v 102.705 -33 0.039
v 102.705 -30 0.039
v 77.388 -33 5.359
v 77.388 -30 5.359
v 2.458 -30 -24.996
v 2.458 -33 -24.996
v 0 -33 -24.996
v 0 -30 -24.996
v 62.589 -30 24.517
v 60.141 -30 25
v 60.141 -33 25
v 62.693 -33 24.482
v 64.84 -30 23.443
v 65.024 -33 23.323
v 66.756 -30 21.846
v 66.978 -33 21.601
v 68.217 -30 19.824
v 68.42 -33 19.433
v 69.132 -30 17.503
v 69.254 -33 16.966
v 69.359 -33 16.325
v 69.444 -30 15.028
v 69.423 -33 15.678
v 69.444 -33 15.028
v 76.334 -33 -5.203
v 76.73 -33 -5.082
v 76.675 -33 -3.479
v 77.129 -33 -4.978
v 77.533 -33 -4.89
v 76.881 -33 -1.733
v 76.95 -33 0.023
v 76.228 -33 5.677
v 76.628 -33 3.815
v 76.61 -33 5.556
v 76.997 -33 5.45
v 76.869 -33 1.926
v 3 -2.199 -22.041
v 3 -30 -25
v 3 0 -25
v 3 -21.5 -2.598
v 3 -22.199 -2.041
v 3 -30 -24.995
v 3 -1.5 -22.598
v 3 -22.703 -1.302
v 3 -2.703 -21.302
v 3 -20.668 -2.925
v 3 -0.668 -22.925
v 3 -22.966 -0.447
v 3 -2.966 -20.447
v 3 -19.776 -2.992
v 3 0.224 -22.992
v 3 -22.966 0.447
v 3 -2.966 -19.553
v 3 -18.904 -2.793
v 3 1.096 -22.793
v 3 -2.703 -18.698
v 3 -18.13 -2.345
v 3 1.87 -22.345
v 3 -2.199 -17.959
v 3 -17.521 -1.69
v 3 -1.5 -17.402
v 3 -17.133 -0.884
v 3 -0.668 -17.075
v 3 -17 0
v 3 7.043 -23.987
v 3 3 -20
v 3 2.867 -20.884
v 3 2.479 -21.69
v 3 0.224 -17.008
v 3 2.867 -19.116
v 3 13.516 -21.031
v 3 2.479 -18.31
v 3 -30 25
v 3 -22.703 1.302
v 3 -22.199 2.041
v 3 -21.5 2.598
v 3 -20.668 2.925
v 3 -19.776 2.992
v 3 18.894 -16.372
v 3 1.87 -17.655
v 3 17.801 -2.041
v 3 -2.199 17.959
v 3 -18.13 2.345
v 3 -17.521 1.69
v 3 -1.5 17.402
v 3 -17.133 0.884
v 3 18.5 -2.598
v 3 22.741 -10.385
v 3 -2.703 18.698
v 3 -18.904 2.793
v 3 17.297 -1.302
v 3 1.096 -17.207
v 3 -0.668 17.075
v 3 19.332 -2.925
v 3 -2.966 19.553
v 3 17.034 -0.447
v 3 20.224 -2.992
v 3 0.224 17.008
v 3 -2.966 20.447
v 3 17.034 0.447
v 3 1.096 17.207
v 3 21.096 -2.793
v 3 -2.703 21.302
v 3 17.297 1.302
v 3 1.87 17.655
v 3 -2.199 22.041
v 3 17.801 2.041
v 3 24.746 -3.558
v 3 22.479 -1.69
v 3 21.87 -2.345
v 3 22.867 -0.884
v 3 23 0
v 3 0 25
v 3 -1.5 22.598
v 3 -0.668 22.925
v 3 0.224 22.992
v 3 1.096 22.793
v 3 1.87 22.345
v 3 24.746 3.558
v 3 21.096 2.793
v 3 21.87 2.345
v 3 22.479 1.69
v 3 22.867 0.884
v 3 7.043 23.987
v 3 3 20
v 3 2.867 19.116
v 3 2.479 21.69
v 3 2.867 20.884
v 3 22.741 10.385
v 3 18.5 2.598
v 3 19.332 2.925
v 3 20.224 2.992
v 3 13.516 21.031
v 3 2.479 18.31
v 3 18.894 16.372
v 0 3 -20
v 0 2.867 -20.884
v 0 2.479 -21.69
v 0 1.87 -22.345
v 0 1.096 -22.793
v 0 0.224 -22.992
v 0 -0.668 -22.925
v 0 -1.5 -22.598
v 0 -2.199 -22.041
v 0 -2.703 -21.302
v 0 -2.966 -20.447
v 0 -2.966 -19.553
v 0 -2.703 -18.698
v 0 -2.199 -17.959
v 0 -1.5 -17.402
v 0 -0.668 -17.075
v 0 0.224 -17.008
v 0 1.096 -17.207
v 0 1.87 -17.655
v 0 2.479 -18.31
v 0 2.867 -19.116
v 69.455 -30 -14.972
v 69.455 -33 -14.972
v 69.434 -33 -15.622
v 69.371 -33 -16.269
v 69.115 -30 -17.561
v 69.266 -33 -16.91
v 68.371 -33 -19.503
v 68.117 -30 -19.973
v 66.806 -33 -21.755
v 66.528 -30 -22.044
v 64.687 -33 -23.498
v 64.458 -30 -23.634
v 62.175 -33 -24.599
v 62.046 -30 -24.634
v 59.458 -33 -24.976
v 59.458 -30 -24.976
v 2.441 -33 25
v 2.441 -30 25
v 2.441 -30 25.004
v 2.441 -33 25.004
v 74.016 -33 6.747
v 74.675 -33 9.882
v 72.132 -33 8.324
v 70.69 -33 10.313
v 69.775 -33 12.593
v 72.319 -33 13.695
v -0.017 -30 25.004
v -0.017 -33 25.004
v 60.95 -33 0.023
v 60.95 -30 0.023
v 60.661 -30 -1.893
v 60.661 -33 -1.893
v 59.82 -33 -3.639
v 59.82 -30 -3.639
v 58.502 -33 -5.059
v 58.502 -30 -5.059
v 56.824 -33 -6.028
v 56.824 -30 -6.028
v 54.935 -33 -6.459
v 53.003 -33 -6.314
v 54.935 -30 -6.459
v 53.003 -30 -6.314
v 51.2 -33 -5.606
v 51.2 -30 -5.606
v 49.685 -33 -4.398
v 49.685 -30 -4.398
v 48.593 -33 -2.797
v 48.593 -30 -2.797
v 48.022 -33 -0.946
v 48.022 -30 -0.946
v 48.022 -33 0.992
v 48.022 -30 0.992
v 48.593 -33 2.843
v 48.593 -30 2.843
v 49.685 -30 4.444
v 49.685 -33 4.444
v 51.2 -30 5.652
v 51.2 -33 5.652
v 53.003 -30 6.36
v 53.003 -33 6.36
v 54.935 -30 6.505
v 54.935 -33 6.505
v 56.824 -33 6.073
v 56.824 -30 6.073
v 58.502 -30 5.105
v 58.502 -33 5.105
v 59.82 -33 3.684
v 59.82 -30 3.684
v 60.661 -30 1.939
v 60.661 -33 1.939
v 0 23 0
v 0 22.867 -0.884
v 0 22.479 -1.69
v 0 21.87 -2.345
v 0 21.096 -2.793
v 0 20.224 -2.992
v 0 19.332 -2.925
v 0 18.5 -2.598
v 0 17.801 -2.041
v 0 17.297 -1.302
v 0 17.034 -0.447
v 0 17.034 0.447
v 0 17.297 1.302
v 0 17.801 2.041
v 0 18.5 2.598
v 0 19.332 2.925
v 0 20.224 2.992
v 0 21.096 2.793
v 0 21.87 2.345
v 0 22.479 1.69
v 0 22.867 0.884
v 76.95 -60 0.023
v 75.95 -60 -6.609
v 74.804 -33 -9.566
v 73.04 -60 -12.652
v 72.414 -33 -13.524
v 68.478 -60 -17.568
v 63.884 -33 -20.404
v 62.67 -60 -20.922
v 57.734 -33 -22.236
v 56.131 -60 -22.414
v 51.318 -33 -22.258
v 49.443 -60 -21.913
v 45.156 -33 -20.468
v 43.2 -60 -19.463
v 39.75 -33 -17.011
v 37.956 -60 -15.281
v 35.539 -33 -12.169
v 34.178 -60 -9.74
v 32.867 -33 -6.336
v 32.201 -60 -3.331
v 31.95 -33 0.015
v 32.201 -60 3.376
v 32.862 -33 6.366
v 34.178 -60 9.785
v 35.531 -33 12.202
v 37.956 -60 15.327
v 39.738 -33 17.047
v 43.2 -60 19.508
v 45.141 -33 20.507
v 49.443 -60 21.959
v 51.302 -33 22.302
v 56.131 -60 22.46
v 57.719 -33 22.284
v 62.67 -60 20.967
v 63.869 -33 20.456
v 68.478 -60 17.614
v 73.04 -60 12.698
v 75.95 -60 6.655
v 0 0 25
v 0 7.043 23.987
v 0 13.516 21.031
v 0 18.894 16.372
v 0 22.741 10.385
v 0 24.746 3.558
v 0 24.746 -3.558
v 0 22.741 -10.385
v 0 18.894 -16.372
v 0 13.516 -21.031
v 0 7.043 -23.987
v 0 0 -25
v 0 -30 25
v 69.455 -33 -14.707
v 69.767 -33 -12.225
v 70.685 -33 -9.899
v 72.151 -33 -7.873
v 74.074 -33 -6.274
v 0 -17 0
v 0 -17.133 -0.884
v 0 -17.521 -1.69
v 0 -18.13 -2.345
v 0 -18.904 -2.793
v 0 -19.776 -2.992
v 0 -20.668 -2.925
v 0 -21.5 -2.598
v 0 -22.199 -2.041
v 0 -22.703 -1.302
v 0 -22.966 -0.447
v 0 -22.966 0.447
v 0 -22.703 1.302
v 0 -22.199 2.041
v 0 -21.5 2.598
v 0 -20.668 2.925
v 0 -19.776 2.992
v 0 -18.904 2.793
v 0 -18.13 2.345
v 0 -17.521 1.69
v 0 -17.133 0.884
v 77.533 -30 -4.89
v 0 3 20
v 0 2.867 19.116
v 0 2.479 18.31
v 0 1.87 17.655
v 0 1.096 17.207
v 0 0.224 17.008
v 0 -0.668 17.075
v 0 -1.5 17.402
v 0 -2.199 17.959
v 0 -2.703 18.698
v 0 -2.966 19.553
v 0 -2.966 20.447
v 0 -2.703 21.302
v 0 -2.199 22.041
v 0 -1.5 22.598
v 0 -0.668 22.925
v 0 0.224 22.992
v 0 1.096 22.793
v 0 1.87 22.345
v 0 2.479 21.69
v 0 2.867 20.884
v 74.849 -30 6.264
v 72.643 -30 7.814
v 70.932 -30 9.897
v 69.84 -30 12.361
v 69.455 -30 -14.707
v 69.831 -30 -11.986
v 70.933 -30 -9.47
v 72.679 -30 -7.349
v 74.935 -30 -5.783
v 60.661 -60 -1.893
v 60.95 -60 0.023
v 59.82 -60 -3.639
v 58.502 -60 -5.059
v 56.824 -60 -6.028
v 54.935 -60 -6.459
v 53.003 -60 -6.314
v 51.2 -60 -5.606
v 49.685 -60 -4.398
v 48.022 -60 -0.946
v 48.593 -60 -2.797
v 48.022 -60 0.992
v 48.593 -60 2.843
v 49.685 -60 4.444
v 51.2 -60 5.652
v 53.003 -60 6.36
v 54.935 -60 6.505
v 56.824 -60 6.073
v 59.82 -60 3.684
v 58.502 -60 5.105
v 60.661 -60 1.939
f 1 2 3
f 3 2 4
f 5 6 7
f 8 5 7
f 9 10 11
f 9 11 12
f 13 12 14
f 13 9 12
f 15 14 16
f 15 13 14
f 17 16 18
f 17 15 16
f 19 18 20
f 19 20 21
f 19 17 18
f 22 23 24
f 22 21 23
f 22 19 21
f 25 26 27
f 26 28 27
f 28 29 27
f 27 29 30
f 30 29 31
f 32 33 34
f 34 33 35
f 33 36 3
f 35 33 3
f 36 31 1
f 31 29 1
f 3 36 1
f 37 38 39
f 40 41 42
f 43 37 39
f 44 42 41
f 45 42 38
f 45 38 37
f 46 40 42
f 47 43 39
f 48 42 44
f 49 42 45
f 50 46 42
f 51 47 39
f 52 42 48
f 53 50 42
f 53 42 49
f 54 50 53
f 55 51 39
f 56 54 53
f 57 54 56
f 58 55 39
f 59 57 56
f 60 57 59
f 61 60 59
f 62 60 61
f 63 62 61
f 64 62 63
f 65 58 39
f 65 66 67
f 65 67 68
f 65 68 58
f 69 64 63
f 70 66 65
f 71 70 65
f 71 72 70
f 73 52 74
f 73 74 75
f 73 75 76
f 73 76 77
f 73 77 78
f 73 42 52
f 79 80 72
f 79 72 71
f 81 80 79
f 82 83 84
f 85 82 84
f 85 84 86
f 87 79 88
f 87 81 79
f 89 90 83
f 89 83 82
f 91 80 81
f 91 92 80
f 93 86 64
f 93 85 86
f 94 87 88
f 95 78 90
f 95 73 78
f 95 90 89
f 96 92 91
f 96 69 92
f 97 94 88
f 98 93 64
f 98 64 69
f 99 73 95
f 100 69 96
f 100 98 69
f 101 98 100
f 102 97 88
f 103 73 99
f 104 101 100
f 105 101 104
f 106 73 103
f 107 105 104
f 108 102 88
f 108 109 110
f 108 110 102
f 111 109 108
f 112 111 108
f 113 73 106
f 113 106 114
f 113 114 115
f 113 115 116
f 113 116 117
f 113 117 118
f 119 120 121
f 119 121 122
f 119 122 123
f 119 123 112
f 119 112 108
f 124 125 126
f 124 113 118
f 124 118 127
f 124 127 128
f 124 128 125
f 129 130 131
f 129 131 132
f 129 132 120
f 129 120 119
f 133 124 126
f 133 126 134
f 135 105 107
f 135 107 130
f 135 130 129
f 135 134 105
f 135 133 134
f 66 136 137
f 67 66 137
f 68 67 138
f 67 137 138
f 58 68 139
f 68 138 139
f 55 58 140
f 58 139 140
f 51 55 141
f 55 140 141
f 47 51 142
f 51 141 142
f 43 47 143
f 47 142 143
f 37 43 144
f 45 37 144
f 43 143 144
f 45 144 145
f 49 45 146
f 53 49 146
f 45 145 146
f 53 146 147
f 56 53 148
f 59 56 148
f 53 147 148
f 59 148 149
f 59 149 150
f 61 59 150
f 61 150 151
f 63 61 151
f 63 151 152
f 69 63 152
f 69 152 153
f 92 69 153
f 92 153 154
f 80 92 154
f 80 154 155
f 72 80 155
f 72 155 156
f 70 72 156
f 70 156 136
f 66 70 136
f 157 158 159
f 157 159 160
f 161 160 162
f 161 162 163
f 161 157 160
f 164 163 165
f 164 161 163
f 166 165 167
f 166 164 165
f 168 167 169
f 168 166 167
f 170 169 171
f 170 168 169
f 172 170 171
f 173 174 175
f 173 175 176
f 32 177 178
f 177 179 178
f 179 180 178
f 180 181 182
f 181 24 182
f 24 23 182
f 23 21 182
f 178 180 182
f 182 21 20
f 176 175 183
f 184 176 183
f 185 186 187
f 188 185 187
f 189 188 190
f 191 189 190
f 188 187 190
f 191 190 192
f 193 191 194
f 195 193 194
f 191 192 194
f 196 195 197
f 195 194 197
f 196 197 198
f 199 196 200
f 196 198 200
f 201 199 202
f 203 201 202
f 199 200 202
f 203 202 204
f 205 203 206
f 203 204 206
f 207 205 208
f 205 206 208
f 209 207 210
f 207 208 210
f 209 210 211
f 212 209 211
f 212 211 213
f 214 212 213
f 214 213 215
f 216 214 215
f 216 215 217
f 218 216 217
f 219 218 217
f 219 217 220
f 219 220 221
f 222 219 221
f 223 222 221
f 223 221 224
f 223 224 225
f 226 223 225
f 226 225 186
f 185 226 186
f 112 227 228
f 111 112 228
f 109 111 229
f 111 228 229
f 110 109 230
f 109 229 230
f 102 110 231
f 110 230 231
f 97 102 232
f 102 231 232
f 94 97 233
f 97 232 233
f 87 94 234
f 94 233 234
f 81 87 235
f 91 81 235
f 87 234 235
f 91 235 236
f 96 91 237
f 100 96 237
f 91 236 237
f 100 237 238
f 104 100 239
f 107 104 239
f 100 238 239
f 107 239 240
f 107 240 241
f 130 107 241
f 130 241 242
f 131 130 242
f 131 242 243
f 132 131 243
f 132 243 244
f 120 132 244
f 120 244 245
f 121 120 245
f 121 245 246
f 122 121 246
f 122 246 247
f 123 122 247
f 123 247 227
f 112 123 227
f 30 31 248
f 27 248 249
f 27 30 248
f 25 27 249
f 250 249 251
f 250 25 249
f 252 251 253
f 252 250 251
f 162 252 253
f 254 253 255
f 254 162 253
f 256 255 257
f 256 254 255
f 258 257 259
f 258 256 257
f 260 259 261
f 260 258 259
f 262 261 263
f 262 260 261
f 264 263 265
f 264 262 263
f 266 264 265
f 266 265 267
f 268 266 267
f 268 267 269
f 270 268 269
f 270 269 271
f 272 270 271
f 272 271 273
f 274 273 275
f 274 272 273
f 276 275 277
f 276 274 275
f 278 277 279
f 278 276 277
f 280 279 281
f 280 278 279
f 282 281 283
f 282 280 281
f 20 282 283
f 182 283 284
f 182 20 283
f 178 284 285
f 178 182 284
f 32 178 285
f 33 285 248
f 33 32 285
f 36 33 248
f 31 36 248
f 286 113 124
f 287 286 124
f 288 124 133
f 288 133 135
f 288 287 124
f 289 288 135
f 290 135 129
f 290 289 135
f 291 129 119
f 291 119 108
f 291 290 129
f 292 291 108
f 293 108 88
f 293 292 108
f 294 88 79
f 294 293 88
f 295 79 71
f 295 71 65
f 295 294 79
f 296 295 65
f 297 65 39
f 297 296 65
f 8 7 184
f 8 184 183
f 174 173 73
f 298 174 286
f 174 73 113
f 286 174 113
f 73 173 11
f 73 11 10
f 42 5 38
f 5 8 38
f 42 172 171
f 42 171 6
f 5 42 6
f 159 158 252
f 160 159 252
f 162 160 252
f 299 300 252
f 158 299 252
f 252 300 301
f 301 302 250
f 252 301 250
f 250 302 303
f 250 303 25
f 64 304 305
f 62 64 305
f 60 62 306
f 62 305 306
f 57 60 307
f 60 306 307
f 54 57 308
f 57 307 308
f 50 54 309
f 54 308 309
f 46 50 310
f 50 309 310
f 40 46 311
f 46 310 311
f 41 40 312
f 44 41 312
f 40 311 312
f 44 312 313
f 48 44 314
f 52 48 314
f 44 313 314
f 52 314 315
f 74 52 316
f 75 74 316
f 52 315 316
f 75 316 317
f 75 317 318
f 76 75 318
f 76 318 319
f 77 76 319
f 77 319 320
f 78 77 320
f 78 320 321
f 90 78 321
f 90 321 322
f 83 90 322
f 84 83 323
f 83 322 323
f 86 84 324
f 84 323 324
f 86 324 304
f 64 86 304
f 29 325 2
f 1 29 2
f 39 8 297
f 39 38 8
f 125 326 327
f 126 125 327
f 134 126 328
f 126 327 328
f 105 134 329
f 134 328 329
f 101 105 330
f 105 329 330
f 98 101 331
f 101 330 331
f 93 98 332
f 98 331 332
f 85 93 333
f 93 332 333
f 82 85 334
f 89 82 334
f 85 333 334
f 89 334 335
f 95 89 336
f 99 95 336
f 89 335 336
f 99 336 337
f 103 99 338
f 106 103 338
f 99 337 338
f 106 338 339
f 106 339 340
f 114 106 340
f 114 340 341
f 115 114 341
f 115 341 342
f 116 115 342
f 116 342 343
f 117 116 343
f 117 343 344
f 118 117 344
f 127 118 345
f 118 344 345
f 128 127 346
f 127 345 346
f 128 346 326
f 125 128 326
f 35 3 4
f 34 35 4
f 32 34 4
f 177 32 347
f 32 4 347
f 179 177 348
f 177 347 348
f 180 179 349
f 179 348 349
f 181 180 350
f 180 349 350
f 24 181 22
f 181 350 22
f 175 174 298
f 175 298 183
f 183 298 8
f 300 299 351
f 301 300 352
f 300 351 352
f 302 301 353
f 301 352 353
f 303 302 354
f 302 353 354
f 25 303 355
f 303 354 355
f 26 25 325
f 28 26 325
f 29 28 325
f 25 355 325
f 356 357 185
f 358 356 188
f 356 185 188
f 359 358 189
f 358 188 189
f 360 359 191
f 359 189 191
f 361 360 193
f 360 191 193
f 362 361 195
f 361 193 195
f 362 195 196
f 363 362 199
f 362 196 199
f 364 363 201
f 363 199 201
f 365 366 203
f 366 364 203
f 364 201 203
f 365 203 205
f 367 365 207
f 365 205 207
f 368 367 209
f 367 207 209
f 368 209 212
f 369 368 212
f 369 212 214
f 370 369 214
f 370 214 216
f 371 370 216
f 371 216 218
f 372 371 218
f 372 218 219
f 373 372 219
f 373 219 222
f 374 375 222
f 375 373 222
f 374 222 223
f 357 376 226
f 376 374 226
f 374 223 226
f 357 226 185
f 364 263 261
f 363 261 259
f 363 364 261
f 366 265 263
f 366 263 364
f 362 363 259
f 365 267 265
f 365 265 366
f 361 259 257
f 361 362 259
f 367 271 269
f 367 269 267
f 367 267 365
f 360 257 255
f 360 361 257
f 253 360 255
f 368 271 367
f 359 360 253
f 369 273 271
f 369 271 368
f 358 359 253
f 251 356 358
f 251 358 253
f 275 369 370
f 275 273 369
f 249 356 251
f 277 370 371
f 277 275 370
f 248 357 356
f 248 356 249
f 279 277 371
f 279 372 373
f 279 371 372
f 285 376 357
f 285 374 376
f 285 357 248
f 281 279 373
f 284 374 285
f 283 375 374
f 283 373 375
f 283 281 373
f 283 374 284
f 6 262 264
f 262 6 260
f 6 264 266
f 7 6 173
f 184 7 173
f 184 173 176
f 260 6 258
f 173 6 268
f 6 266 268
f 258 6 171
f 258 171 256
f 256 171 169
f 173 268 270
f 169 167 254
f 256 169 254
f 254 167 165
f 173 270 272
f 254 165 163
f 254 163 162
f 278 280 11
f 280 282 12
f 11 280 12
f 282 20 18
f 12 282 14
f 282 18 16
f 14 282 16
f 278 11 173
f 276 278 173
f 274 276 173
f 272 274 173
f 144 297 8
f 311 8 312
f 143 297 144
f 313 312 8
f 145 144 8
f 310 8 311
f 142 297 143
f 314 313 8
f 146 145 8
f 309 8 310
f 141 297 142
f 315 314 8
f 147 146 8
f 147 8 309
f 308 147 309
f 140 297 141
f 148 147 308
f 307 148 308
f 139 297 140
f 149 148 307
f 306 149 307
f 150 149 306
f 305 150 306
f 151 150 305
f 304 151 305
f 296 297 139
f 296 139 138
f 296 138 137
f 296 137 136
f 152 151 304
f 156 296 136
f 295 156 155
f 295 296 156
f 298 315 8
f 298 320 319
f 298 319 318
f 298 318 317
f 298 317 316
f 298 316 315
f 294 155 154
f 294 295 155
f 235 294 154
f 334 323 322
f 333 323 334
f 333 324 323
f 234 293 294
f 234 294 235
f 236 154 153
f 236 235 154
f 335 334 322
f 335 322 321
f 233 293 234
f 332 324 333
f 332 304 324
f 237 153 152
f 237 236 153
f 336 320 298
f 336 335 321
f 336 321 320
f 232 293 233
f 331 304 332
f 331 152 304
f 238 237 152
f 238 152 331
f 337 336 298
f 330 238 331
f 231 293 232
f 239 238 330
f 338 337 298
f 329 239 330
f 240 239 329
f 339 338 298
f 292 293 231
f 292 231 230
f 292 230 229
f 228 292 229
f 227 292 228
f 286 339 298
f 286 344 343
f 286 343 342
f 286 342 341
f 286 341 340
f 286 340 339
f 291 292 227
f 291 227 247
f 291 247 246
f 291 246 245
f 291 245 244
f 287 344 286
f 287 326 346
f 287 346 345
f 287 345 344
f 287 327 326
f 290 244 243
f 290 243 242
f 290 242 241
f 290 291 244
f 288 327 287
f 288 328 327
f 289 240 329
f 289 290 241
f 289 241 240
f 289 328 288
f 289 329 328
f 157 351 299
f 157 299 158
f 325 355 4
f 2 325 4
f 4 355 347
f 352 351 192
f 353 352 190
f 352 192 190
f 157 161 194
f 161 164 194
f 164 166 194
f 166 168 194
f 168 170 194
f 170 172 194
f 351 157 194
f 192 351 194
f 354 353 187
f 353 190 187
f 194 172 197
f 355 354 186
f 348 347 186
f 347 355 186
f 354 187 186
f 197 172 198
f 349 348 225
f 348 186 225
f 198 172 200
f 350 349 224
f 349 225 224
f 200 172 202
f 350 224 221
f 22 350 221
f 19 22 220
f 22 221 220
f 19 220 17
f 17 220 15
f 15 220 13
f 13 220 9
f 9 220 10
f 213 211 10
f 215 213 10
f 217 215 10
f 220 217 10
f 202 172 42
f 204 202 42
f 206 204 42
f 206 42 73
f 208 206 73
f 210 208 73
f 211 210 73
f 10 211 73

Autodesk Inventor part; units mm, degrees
ref_plane "YZ Plane" through (0, 0, 0) normal (1, 0, 0) x (0, 1, 0)
ref_plane "XZ Plane" through (0, 0, 0) normal (0, 1, 0) x (-1, 0, 0)
ref_plane "XY Plane" through (0, 0, 0) normal (0, 0, 1) x (1, 0, 0)
sketch "Boceto1" plane through (0, 0, 0) normal (1, 0, 0) x (0, 1, 0)
  circle A0 centre (0, 0) radius 25
  circle A1 centre (0, 0) radius 20
  circle A2 centre (20, 0) radius 3
  circle A3 centre (0, 20) radius 3
  circle A4 centre (-20, 0) radius 3
  circle A5 centre (0, -20) radius 3
  line L0 (0, 25) -> (-31.5, 25)
  line L1 (-31.5, 25) -> (-31.5, -25)
  line L2 (-31.5, -25) -> (0, -25)
  line L3 (0, -25) -> (0, 25)
  point P0 (0, -25)
  dimension "d1" = 40
  dimension "d0" = 50
  dimension "d2" = 6
  dimension "d5" = 360
  dimension "d7" = 31.5
  dimension "d8" = 0
  dimension "d9" = 50
  dimension "d10" = 25
extrude "Extrusión1" add sketch "Boceto1" along normal blind 3 contours A0 L3 A5 A1 A2 A3 | L3 A3 A1 A4 A5 A0 | A0 L2 L1 L0 | A3 L3 A5 A1 A4 | A1 A2 A5 L3 A3
sketch "Boceto2" plane through (3, 0, 0) normal (1, 0, 0) x (0, 0, -1)
  line L0 (25, -30) -> (-25, -30)
  line L1 (-25, -30) -> (-25, -33)
  line L2 (-25, -33) -> (25, -33)
  line L3 (25, -33) -> (25, -30)
  line L4 (-25, -31.5) -> (25, -31.5) projected
  point P0 (0, 0)
  dimension "d13" = 50
  dimension "d14" = 3
  dimension "d15" = 1.5
extrude "Extrusión2" add sketch "Boceto2" along normal blind 100
sketch "Boceto3" plane through (3, 0, 0) normal (-1, 0, 0) x (0, 0, 1)
  line L0 (25, -31.5) -> (-25, -31.5) projected
  line L1 (-25, -33) -> (-25, -31.5) projected
  line L2 (25, -31.5) -> (-25, -31.5)
  line L3 (-25, -31.5) -> (-25, -33)
  line L4 (-25, -33) -> (25, -33)
  line L5 (25, -33) -> (25, -31.5)
  point P0 (0, 0)
extrude "Extrusión3" add sketch "Boceto3" along normal blind 3
sketch "Boceto4" plane through (3, -30, 25) normal (0, 1, 0) x (1, 0, 0)
  line L0 (-3.5591, -0.0033) -> (56.4409, -0.0243)
  line L1 (56.4583, 49.9757) -> (-83.1198, 50.0244)
  circle A0 centre (51.4496, 24.9772) radius 6.5
  arc A1 (56.4409, -0.0243) -> (66.4443, 9.9722) centre (56.4443, 9.9757) ccw
  arc A2 (66.4548, 39.9722) -> (56.4583, 49.9757) centre (56.4548, 39.9757) ccw
  line L2 (-3.5591, -0.0033) -> (-0.5591, -0.0044)
  line L3 (-0.5591, -0.0044) -> (-0.5417, 49.9956)
  line L4 (-0.5417, 49.9956) -> (-3.5417, 49.9967)
  line L5 (-3.5581, 2.9967) -> (-0.5581, 2.9956)
  line L6 (-3.557, 5.9967) -> (-0.557, 5.9956)
  line L7 (-3.556, 8.9967) -> (-0.556, 8.9956)
  line L8 (-3.555, 11.9967) -> (-0.555, 11.9956)
  line L9 (-3.5539, 14.9967) -> (-0.5539, 14.9956)
  line L10 (-3.5529, 17.9967) -> (-0.5529, 17.9956)
  line L11 (-3.5518, 20.9967) -> (-0.5518, 20.9956)
  line L12 (-3.5508, 23.9967) -> (-0.5508, 23.9956)
  line L13 (-3.5497, 26.9967) -> (-0.5497, 26.9956)
  line L14 (-3.5487, 29.9967) -> (-0.5487, 29.9956)
  line L15 (-3.5476, 32.9967) -> (-0.5476, 32.9956)
  line L16 (-3.5466, 35.9967) -> (-0.5466, 35.9956)
  line L17 (-3.5455, 38.9967) -> (-0.5455, 38.9956)
  line L18 (-3.5445, 41.9967) -> (-0.5445, 41.9956)
  line L19 (-3.5434, 44.9967) -> (-0.5434, 44.9956)
  line L20 (-3.5424, 47.9967) -> (-0.5424, 47.9956)
  line L21 (-3.5413, 50.9967) -> (-0.5413, 50.9956)
  line L22 (-3.5403, 53.9967) -> (-0.5403, 53.9956)
  line L23 (-3.5392, 56.9967) -> (-0.5392, 56.9956)
  line L24 (-3.5382, 59.9967) -> (-0.5382, 59.9956)
  line L25 (74.533, 29.8898) -> (99.7047, 24.9606)
  line L26 (99.7047, 24.9606) -> (74.3879, 19.6408)
  line L27 (66.4443, 9.9722) -> (66.4443, 9.858)
  line L28 (66.4547, 39.7069) -> (66.4548, 39.9722)
  arc A3 (74.3879, 19.6408) -> (66.4443, 9.858) centre (76.4443, 9.8545) ccw
  arc A4 (66.4547, 39.7069) -> (74.533, 29.8898) centre (76.4547, 39.7034) ccw
  line L29 (0, 50) -> (100, 50) projected
  line L30 (0, 0) -> (100, 0) projected
  circle A5 centre (51.4496, 24.9772) radius 79.9654
  point P0 (-3, 25)
  point P1 (-13.1198, 50)
  point P2 (66.4518, 31.4722)
  point P3 (66.4471, 17.9722)
  dimension "d24" = 70
  dimension "d25" = 13
  dimension "d26" = 10
  dimension "d27" = 3
  dimension "d28" = 3
  dimension "d29" = 7.005
  dimension "d30" = 6.495
  dimension "d31" = 10
  dimension "d33" = 0
  dimension "d34" = 179.98
extrude "Extrusión4" cut sketch "Boceto4" against normal blind 3
sketch "Boceto6" plane through (59.4583, -33, -24.9757) normal (0.0003491, 0, -0.9999999) x (-0.9999999, 0, -0.0003491)
  line L0 (57, 0) -> (-0.7, 0) projected
  line L1 (56.4583, 3) -> (59.4583, 3) projected
  line L2 (57, 0) -> (59.4583, 0)
  line L3 (59.4583, 0) -> (59.4583, 3)
  line L4 (59.4583, 3) -> (57, 3)
  line L5 (57, 3) -> (57, 0)
  point P0 (59.4496, 33)
extrude "Extrusión5" add sketch "Boceto6" against normal blind 50
sketch "Boceto7" plane through (2.4409, -33, 25) normal (0, -1, 0) x (1, 0, 0)
  circle A0 centre (52.0087, -24.9772) radius 6.5 projected
  circle A1 centre (52.0087, -24.9772) radius 22.5
  point P0 (-2.4409, -25)
  dimension "d39" = 45
extrude "Extrusión6" add sketch "Boceto7" along normal blind 27
properties part number "Herramienta"
